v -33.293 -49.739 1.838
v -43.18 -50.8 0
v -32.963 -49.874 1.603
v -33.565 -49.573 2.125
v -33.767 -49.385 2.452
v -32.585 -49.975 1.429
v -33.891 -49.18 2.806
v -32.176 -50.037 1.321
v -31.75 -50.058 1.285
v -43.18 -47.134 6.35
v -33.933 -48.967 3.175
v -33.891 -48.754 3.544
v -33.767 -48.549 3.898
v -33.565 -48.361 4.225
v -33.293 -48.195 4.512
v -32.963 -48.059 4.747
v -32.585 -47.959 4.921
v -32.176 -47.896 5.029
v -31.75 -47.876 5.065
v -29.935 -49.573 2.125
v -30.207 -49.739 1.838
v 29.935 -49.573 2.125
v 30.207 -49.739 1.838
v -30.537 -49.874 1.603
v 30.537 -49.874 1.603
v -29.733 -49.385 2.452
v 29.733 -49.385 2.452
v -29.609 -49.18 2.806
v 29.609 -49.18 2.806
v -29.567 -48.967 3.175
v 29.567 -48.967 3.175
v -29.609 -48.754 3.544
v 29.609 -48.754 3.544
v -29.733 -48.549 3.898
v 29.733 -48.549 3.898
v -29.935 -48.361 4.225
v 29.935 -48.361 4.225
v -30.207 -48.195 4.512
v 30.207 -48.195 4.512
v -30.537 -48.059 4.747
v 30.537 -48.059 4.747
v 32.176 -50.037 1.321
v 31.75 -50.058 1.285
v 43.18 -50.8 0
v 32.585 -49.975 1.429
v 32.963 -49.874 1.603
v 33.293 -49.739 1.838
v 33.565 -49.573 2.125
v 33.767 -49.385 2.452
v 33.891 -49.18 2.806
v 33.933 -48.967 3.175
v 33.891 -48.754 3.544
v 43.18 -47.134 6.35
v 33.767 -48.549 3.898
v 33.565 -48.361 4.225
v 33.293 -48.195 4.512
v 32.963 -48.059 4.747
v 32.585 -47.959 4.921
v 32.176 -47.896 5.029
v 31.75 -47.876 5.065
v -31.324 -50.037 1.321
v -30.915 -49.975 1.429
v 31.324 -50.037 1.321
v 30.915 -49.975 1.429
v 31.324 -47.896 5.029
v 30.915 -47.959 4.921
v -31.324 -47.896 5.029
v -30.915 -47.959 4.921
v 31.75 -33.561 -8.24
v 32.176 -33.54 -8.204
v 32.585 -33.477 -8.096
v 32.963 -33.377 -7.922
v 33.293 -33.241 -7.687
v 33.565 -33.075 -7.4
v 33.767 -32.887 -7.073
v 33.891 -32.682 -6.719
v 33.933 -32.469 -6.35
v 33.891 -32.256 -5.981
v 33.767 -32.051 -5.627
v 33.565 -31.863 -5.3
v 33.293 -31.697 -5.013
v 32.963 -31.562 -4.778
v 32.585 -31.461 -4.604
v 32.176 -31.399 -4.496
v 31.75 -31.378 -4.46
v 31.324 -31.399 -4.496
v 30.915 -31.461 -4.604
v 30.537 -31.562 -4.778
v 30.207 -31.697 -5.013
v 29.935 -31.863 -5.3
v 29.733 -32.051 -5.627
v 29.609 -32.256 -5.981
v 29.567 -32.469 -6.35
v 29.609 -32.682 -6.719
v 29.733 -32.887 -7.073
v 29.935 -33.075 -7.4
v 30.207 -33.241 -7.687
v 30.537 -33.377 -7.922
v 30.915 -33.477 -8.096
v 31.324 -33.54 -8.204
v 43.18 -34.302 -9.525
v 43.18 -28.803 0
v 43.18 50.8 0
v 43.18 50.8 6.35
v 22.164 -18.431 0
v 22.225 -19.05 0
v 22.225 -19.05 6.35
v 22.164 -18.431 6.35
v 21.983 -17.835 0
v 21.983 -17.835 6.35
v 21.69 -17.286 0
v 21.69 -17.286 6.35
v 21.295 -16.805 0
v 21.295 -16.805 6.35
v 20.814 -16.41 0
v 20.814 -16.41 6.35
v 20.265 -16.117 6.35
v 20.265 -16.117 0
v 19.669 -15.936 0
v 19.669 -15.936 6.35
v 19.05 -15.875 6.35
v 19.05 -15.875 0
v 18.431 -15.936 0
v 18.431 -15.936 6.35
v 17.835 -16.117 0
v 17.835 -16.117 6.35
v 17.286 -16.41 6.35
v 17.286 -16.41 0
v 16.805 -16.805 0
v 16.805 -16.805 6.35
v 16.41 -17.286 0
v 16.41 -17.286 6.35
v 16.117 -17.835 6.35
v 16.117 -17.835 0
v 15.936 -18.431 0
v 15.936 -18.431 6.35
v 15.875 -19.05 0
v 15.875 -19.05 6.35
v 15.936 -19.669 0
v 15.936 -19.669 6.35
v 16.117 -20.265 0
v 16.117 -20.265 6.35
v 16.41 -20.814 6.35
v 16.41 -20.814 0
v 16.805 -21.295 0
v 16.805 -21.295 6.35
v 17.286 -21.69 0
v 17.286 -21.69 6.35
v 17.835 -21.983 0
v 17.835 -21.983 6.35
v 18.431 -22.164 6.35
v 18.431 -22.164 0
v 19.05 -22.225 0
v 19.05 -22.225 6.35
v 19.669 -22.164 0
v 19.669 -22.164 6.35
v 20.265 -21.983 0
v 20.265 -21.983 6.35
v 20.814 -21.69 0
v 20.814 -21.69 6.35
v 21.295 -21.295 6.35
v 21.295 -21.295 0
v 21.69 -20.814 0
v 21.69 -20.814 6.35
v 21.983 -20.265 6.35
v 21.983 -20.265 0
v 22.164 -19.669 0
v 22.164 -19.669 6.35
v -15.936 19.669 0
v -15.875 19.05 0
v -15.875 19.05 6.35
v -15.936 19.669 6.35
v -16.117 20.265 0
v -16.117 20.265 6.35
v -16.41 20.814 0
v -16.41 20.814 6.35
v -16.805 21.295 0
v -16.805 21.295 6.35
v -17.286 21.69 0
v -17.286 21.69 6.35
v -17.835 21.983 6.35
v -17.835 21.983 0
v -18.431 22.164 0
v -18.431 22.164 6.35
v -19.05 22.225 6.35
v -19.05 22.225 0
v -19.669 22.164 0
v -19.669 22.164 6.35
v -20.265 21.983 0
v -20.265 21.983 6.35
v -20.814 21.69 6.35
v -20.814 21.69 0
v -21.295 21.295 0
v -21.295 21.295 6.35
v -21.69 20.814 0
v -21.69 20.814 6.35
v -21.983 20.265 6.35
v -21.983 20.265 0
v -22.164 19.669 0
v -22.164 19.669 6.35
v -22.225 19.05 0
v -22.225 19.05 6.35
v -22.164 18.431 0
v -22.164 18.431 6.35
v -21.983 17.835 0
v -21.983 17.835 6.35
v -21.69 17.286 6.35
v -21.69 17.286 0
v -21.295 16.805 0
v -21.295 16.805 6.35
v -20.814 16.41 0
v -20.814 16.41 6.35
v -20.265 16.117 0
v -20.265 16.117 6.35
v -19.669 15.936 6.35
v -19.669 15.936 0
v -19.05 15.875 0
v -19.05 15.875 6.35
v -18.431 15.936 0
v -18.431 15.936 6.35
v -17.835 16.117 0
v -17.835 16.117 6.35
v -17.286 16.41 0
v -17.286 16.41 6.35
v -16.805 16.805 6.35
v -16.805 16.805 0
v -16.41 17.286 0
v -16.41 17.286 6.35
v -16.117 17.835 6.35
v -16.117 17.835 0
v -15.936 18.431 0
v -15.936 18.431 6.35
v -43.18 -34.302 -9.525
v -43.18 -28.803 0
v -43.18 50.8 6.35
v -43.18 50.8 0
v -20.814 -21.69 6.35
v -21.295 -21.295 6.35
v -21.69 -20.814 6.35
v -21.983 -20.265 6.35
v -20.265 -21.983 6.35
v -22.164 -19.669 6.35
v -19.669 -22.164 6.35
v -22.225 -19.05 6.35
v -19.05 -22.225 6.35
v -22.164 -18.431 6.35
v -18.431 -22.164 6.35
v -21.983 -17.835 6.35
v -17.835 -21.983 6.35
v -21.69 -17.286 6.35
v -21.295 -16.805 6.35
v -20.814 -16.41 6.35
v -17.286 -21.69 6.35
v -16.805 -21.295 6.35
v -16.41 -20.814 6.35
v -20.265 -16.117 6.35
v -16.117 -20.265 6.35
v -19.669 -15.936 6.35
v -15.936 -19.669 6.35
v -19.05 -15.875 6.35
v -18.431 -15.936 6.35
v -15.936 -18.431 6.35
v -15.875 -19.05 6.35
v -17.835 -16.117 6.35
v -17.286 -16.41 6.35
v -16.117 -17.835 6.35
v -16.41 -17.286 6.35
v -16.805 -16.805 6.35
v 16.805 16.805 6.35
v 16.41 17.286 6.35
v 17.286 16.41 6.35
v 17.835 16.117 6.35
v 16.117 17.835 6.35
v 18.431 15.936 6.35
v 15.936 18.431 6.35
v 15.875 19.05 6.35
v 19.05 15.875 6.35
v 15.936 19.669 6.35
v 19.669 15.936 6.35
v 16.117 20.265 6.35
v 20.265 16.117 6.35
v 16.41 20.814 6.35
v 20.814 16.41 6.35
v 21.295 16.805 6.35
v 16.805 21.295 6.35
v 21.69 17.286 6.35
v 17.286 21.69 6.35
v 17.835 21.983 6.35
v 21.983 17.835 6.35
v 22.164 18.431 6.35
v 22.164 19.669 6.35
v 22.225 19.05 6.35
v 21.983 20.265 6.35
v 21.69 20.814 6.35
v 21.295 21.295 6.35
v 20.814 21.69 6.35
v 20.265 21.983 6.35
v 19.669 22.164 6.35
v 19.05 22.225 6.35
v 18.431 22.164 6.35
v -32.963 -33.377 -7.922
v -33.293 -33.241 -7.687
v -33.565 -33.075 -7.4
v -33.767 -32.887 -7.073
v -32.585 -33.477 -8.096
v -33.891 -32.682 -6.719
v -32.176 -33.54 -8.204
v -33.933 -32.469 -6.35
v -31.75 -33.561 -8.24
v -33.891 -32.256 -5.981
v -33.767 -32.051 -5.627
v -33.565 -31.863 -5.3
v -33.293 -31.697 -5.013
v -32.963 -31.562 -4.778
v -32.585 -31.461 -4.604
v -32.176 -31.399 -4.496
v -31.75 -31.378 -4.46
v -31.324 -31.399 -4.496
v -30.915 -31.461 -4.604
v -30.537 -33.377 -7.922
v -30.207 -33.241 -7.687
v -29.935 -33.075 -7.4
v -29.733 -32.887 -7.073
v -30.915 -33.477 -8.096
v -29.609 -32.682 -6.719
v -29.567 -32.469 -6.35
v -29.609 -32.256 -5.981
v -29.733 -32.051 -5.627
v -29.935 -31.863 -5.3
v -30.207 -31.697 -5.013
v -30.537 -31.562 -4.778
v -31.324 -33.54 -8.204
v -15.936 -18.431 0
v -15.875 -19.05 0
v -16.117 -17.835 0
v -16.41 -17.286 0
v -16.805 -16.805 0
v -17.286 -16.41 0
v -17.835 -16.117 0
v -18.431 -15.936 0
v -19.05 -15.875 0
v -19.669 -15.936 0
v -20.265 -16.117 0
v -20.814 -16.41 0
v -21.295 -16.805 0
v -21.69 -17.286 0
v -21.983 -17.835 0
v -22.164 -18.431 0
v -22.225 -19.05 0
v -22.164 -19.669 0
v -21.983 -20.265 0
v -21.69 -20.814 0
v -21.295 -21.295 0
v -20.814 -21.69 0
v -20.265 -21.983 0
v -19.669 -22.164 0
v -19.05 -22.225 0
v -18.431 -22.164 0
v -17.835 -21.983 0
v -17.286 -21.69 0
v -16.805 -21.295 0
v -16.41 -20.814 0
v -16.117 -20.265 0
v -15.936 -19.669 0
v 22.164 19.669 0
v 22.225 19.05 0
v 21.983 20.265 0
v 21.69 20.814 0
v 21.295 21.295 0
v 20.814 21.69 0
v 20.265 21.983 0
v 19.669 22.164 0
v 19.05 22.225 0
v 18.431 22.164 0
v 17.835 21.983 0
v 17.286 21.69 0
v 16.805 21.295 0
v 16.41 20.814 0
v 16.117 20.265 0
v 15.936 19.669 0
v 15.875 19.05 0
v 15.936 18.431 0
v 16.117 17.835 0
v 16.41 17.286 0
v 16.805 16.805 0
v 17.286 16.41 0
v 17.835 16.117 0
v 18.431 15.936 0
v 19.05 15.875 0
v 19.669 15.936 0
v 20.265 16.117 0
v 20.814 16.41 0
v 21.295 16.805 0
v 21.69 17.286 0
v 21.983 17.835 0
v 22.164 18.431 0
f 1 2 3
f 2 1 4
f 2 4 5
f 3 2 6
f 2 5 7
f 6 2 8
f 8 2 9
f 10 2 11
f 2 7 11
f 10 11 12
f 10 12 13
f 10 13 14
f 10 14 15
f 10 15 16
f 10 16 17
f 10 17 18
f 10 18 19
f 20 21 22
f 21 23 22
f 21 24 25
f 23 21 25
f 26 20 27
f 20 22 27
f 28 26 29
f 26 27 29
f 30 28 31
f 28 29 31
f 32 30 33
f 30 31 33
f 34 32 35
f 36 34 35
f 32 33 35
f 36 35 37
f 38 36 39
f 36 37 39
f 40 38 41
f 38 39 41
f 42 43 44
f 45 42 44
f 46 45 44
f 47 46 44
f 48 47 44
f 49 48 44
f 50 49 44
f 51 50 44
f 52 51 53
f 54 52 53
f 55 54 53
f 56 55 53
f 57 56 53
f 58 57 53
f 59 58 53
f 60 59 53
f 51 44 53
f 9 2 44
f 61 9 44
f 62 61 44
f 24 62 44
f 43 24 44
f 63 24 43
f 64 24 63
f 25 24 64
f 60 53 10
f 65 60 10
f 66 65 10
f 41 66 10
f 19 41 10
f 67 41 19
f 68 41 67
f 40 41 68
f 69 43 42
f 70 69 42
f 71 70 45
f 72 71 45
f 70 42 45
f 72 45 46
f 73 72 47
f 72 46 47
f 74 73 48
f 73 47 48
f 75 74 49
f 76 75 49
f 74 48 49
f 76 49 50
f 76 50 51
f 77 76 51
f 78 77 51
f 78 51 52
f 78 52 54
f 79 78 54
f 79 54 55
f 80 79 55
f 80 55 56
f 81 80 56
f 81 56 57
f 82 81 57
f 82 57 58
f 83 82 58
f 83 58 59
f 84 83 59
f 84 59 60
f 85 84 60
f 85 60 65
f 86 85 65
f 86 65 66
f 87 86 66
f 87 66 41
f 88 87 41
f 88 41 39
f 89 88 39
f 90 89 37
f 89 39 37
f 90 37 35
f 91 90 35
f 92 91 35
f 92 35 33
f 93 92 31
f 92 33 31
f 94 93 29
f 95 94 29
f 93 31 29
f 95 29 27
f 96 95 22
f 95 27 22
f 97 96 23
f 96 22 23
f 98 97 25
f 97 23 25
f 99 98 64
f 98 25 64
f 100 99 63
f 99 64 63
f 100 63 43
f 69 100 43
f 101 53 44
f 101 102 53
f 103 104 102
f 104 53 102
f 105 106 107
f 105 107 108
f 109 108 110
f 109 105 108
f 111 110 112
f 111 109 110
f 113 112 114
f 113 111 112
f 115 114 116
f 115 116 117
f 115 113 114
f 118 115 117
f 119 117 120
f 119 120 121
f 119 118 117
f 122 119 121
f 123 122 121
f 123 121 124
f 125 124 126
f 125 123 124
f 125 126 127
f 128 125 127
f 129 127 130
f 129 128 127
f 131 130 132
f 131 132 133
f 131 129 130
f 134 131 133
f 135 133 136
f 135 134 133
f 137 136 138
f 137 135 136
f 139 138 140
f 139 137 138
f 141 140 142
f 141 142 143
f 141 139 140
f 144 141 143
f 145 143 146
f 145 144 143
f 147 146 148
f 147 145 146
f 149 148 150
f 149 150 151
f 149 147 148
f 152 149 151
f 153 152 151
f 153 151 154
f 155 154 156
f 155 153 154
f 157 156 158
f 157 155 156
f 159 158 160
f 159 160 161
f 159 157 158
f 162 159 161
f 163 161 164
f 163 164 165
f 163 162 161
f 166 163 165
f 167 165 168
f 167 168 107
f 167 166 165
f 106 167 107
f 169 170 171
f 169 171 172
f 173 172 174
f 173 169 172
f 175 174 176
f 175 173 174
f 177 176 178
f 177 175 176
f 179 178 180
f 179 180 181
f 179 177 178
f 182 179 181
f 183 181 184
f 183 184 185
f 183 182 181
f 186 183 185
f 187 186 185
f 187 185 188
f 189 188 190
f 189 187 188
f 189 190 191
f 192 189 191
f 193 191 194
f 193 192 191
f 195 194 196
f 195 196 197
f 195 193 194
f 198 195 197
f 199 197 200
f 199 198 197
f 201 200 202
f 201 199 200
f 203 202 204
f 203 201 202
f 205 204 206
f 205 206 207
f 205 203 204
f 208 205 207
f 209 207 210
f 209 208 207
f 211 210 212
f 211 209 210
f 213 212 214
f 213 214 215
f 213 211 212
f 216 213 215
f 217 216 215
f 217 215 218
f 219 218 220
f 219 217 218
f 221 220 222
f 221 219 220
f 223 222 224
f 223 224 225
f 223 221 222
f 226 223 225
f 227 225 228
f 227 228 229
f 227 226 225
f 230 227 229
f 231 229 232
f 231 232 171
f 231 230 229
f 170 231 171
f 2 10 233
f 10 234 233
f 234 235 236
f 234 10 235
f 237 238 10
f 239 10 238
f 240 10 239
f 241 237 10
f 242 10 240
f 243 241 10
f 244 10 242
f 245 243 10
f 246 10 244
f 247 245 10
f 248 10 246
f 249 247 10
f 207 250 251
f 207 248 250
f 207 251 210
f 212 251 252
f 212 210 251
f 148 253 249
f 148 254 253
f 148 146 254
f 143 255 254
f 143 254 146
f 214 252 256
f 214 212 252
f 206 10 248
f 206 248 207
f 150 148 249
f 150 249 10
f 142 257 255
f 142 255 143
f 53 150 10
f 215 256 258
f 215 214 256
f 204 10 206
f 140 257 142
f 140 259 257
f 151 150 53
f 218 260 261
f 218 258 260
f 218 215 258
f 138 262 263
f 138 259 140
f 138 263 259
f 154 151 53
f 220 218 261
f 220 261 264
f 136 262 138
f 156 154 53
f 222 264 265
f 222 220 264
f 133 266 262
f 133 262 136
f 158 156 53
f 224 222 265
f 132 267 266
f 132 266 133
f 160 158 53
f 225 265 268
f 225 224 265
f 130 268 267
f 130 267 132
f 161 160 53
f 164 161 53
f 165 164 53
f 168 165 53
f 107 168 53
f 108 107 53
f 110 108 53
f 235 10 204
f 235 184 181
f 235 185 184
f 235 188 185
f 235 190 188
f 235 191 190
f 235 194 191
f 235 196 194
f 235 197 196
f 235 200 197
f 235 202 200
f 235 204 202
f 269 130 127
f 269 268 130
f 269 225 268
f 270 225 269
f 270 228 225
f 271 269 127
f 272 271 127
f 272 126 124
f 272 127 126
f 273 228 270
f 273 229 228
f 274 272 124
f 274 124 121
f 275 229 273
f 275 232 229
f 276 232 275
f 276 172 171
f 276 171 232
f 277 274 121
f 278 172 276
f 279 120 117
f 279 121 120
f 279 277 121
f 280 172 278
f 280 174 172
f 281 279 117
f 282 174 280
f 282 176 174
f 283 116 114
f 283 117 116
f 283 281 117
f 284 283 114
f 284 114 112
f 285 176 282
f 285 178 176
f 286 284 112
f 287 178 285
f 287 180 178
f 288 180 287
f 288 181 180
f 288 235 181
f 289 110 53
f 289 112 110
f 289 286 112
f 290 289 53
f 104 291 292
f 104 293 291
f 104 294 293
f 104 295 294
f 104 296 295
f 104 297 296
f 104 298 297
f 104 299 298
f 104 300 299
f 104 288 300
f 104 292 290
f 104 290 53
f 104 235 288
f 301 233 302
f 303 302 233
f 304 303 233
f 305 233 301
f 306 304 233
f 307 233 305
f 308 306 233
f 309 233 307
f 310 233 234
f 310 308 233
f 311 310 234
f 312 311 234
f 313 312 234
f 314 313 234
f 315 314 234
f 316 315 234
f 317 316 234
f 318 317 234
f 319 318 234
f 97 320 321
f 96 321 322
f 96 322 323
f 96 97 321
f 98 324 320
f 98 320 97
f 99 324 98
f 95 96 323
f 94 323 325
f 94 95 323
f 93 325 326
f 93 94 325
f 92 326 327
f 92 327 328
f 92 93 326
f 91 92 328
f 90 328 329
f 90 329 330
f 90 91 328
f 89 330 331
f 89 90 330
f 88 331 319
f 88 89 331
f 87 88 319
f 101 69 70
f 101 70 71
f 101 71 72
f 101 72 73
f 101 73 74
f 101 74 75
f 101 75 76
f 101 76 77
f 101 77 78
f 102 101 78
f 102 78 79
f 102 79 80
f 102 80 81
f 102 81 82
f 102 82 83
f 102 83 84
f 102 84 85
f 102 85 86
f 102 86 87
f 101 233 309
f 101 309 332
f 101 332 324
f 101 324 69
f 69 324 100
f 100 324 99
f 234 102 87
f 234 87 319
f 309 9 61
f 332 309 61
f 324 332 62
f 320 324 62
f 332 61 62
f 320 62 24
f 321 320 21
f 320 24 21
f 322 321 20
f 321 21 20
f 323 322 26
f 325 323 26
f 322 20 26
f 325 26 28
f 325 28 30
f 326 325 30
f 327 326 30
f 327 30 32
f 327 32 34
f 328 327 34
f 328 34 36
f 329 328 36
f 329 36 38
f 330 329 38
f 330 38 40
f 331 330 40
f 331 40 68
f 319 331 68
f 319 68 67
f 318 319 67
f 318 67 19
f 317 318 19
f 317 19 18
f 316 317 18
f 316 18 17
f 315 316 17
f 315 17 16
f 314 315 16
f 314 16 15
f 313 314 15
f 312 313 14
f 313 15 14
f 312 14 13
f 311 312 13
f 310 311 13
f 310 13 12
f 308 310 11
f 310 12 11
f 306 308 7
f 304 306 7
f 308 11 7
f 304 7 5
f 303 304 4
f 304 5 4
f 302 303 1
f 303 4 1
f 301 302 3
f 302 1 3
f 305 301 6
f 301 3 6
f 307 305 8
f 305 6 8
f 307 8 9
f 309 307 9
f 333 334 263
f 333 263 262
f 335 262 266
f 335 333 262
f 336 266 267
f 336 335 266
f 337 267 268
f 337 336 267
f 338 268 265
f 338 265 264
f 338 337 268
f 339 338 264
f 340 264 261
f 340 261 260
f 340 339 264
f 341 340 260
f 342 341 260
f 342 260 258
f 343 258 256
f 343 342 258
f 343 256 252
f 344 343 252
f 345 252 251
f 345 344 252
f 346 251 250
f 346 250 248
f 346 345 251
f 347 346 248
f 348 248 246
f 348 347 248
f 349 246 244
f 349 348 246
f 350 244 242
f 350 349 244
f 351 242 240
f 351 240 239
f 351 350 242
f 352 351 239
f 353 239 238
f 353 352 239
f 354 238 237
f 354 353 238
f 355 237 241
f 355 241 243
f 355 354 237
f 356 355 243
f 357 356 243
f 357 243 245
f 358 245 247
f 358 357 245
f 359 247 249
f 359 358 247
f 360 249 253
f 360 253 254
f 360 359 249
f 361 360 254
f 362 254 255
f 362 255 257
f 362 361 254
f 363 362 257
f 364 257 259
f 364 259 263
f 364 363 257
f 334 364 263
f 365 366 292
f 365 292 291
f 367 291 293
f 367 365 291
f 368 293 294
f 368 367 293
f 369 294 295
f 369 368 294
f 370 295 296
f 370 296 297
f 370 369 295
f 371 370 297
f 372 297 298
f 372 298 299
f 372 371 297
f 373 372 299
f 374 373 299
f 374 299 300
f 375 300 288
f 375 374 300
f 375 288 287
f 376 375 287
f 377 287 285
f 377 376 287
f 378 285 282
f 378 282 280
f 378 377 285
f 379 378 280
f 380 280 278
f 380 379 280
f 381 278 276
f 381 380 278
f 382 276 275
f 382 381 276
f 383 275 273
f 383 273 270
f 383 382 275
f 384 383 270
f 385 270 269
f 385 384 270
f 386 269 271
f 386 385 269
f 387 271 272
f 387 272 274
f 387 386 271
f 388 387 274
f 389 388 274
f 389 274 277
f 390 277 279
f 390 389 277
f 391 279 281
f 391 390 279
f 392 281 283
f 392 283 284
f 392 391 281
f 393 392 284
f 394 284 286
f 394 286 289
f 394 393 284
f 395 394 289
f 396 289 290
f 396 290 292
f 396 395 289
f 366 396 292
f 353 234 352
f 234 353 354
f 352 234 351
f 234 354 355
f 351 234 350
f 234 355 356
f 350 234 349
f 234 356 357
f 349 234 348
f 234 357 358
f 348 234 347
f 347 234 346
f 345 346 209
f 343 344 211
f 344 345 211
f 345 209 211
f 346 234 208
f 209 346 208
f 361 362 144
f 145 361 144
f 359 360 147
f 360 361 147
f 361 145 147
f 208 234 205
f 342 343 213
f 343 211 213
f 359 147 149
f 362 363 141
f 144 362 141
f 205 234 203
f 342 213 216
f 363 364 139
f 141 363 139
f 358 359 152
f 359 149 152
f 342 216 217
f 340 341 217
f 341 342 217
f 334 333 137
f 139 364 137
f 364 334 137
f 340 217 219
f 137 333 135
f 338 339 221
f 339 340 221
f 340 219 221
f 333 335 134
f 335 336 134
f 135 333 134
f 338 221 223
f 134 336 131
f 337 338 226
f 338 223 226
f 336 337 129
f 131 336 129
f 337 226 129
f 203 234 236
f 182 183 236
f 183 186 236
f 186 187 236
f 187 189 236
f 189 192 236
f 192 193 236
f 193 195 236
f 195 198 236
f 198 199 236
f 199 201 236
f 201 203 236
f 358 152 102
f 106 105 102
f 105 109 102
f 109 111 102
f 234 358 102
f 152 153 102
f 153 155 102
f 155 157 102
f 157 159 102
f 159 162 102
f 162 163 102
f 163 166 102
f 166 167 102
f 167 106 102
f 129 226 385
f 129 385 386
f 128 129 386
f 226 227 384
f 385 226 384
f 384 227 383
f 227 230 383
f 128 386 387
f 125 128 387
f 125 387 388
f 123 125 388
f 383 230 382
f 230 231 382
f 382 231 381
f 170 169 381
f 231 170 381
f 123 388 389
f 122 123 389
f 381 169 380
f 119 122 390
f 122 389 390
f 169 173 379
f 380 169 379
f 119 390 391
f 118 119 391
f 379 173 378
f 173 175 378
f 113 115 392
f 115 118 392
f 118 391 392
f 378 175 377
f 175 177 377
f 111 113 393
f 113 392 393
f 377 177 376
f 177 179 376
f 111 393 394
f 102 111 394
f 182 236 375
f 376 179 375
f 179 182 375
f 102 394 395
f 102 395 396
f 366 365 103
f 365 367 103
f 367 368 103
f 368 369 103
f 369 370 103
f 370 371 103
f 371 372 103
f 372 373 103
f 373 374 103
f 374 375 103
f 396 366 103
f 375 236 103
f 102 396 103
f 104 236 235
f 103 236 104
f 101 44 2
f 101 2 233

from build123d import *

# Parameters (mm, degrees)
SKETCH1_W           = 86.36
SKETCH1_H           = 101.6
SKETCH1_R           = 3.175
BOSS_EXTRUDE1_DEPTH = 6.35
CUT_EXTRUDE1_DEPTH  = 101.394283204
BOSS_EXTRUDE2_DEPTH = 86.36
SKETCH4_R           = 2.1828125
CUT_EXTRUDE2_DEPTH  = 104.736983459


with BuildPart() as part:
    # Sketch1 → Boss-Extrude1 (new body)
    with BuildSketch(Plane.XY):
        Rectangle(SKETCH1_W, SKETCH1_H)
        with Locations((-19.05, 19.05)):
            Circle(SKETCH1_R, mode=Mode.SUBTRACT)
        with Locations((19.05, 19.05)):
            Circle(SKETCH1_R, mode=Mode.SUBTRACT)
        with Locations((-19.05, -19.05)):
            Circle(SKETCH1_R, mode=Mode.SUBTRACT)
        with Locations((19.05, -19.05)):
            Circle(SKETCH1_R, mode=Mode.SUBTRACT)
    extrude(amount=BOSS_EXTRUDE1_DEPTH)

    # Sketch2 → Cut-Extrude1 (cut, through all)
    with BuildSketch(Plane(origin=(43.18, 0, 0), x_dir=(0, 0, -1), z_dir=(1, 0, 0))):
        Polygon((0, -50.8), (-6.35, -47.133825791), (-6.35, -50.8), align=None)
    extrude(amount=-CUT_EXTRUDE1_DEPTH, mode=Mode.SUBTRACT)

    # Sketch3 → Boss-Extrude2 (add, through all)
    with BuildSketch(Plane(origin=(43.18, 0, 0), x_dir=(0, 0, -1), z_dir=(1, 0, 0))):
        Polygon((0, -50.8), (9.525, -34.302216058), (0, -28.802954744), align=None)
    extrude(amount=-BOSS_EXTRUDE2_DEPTH)

    # Sketch4 → Cut-Extrude2 (cut, through all)
    with BuildSketch(Plane(origin=(0, -38.1, 21.997045256), x_dir=(-1, 0, 0), z_dir=(0, -0.8660254037844419, 0.4999999999999946))):
        with Locations(Location((31.75, 21.733825791, 0), (0, 0, 90))):
            Circle(SKETCH4_R)
        with Locations(Location((-31.75, 21.733825791, 0), (0, 0, 90))):
            Circle(SKETCH4_R)
    extrude(amount=-CUT_EXTRUDE2_DEPTH, mode=Mode.SUBTRACT)


solid = part.part
